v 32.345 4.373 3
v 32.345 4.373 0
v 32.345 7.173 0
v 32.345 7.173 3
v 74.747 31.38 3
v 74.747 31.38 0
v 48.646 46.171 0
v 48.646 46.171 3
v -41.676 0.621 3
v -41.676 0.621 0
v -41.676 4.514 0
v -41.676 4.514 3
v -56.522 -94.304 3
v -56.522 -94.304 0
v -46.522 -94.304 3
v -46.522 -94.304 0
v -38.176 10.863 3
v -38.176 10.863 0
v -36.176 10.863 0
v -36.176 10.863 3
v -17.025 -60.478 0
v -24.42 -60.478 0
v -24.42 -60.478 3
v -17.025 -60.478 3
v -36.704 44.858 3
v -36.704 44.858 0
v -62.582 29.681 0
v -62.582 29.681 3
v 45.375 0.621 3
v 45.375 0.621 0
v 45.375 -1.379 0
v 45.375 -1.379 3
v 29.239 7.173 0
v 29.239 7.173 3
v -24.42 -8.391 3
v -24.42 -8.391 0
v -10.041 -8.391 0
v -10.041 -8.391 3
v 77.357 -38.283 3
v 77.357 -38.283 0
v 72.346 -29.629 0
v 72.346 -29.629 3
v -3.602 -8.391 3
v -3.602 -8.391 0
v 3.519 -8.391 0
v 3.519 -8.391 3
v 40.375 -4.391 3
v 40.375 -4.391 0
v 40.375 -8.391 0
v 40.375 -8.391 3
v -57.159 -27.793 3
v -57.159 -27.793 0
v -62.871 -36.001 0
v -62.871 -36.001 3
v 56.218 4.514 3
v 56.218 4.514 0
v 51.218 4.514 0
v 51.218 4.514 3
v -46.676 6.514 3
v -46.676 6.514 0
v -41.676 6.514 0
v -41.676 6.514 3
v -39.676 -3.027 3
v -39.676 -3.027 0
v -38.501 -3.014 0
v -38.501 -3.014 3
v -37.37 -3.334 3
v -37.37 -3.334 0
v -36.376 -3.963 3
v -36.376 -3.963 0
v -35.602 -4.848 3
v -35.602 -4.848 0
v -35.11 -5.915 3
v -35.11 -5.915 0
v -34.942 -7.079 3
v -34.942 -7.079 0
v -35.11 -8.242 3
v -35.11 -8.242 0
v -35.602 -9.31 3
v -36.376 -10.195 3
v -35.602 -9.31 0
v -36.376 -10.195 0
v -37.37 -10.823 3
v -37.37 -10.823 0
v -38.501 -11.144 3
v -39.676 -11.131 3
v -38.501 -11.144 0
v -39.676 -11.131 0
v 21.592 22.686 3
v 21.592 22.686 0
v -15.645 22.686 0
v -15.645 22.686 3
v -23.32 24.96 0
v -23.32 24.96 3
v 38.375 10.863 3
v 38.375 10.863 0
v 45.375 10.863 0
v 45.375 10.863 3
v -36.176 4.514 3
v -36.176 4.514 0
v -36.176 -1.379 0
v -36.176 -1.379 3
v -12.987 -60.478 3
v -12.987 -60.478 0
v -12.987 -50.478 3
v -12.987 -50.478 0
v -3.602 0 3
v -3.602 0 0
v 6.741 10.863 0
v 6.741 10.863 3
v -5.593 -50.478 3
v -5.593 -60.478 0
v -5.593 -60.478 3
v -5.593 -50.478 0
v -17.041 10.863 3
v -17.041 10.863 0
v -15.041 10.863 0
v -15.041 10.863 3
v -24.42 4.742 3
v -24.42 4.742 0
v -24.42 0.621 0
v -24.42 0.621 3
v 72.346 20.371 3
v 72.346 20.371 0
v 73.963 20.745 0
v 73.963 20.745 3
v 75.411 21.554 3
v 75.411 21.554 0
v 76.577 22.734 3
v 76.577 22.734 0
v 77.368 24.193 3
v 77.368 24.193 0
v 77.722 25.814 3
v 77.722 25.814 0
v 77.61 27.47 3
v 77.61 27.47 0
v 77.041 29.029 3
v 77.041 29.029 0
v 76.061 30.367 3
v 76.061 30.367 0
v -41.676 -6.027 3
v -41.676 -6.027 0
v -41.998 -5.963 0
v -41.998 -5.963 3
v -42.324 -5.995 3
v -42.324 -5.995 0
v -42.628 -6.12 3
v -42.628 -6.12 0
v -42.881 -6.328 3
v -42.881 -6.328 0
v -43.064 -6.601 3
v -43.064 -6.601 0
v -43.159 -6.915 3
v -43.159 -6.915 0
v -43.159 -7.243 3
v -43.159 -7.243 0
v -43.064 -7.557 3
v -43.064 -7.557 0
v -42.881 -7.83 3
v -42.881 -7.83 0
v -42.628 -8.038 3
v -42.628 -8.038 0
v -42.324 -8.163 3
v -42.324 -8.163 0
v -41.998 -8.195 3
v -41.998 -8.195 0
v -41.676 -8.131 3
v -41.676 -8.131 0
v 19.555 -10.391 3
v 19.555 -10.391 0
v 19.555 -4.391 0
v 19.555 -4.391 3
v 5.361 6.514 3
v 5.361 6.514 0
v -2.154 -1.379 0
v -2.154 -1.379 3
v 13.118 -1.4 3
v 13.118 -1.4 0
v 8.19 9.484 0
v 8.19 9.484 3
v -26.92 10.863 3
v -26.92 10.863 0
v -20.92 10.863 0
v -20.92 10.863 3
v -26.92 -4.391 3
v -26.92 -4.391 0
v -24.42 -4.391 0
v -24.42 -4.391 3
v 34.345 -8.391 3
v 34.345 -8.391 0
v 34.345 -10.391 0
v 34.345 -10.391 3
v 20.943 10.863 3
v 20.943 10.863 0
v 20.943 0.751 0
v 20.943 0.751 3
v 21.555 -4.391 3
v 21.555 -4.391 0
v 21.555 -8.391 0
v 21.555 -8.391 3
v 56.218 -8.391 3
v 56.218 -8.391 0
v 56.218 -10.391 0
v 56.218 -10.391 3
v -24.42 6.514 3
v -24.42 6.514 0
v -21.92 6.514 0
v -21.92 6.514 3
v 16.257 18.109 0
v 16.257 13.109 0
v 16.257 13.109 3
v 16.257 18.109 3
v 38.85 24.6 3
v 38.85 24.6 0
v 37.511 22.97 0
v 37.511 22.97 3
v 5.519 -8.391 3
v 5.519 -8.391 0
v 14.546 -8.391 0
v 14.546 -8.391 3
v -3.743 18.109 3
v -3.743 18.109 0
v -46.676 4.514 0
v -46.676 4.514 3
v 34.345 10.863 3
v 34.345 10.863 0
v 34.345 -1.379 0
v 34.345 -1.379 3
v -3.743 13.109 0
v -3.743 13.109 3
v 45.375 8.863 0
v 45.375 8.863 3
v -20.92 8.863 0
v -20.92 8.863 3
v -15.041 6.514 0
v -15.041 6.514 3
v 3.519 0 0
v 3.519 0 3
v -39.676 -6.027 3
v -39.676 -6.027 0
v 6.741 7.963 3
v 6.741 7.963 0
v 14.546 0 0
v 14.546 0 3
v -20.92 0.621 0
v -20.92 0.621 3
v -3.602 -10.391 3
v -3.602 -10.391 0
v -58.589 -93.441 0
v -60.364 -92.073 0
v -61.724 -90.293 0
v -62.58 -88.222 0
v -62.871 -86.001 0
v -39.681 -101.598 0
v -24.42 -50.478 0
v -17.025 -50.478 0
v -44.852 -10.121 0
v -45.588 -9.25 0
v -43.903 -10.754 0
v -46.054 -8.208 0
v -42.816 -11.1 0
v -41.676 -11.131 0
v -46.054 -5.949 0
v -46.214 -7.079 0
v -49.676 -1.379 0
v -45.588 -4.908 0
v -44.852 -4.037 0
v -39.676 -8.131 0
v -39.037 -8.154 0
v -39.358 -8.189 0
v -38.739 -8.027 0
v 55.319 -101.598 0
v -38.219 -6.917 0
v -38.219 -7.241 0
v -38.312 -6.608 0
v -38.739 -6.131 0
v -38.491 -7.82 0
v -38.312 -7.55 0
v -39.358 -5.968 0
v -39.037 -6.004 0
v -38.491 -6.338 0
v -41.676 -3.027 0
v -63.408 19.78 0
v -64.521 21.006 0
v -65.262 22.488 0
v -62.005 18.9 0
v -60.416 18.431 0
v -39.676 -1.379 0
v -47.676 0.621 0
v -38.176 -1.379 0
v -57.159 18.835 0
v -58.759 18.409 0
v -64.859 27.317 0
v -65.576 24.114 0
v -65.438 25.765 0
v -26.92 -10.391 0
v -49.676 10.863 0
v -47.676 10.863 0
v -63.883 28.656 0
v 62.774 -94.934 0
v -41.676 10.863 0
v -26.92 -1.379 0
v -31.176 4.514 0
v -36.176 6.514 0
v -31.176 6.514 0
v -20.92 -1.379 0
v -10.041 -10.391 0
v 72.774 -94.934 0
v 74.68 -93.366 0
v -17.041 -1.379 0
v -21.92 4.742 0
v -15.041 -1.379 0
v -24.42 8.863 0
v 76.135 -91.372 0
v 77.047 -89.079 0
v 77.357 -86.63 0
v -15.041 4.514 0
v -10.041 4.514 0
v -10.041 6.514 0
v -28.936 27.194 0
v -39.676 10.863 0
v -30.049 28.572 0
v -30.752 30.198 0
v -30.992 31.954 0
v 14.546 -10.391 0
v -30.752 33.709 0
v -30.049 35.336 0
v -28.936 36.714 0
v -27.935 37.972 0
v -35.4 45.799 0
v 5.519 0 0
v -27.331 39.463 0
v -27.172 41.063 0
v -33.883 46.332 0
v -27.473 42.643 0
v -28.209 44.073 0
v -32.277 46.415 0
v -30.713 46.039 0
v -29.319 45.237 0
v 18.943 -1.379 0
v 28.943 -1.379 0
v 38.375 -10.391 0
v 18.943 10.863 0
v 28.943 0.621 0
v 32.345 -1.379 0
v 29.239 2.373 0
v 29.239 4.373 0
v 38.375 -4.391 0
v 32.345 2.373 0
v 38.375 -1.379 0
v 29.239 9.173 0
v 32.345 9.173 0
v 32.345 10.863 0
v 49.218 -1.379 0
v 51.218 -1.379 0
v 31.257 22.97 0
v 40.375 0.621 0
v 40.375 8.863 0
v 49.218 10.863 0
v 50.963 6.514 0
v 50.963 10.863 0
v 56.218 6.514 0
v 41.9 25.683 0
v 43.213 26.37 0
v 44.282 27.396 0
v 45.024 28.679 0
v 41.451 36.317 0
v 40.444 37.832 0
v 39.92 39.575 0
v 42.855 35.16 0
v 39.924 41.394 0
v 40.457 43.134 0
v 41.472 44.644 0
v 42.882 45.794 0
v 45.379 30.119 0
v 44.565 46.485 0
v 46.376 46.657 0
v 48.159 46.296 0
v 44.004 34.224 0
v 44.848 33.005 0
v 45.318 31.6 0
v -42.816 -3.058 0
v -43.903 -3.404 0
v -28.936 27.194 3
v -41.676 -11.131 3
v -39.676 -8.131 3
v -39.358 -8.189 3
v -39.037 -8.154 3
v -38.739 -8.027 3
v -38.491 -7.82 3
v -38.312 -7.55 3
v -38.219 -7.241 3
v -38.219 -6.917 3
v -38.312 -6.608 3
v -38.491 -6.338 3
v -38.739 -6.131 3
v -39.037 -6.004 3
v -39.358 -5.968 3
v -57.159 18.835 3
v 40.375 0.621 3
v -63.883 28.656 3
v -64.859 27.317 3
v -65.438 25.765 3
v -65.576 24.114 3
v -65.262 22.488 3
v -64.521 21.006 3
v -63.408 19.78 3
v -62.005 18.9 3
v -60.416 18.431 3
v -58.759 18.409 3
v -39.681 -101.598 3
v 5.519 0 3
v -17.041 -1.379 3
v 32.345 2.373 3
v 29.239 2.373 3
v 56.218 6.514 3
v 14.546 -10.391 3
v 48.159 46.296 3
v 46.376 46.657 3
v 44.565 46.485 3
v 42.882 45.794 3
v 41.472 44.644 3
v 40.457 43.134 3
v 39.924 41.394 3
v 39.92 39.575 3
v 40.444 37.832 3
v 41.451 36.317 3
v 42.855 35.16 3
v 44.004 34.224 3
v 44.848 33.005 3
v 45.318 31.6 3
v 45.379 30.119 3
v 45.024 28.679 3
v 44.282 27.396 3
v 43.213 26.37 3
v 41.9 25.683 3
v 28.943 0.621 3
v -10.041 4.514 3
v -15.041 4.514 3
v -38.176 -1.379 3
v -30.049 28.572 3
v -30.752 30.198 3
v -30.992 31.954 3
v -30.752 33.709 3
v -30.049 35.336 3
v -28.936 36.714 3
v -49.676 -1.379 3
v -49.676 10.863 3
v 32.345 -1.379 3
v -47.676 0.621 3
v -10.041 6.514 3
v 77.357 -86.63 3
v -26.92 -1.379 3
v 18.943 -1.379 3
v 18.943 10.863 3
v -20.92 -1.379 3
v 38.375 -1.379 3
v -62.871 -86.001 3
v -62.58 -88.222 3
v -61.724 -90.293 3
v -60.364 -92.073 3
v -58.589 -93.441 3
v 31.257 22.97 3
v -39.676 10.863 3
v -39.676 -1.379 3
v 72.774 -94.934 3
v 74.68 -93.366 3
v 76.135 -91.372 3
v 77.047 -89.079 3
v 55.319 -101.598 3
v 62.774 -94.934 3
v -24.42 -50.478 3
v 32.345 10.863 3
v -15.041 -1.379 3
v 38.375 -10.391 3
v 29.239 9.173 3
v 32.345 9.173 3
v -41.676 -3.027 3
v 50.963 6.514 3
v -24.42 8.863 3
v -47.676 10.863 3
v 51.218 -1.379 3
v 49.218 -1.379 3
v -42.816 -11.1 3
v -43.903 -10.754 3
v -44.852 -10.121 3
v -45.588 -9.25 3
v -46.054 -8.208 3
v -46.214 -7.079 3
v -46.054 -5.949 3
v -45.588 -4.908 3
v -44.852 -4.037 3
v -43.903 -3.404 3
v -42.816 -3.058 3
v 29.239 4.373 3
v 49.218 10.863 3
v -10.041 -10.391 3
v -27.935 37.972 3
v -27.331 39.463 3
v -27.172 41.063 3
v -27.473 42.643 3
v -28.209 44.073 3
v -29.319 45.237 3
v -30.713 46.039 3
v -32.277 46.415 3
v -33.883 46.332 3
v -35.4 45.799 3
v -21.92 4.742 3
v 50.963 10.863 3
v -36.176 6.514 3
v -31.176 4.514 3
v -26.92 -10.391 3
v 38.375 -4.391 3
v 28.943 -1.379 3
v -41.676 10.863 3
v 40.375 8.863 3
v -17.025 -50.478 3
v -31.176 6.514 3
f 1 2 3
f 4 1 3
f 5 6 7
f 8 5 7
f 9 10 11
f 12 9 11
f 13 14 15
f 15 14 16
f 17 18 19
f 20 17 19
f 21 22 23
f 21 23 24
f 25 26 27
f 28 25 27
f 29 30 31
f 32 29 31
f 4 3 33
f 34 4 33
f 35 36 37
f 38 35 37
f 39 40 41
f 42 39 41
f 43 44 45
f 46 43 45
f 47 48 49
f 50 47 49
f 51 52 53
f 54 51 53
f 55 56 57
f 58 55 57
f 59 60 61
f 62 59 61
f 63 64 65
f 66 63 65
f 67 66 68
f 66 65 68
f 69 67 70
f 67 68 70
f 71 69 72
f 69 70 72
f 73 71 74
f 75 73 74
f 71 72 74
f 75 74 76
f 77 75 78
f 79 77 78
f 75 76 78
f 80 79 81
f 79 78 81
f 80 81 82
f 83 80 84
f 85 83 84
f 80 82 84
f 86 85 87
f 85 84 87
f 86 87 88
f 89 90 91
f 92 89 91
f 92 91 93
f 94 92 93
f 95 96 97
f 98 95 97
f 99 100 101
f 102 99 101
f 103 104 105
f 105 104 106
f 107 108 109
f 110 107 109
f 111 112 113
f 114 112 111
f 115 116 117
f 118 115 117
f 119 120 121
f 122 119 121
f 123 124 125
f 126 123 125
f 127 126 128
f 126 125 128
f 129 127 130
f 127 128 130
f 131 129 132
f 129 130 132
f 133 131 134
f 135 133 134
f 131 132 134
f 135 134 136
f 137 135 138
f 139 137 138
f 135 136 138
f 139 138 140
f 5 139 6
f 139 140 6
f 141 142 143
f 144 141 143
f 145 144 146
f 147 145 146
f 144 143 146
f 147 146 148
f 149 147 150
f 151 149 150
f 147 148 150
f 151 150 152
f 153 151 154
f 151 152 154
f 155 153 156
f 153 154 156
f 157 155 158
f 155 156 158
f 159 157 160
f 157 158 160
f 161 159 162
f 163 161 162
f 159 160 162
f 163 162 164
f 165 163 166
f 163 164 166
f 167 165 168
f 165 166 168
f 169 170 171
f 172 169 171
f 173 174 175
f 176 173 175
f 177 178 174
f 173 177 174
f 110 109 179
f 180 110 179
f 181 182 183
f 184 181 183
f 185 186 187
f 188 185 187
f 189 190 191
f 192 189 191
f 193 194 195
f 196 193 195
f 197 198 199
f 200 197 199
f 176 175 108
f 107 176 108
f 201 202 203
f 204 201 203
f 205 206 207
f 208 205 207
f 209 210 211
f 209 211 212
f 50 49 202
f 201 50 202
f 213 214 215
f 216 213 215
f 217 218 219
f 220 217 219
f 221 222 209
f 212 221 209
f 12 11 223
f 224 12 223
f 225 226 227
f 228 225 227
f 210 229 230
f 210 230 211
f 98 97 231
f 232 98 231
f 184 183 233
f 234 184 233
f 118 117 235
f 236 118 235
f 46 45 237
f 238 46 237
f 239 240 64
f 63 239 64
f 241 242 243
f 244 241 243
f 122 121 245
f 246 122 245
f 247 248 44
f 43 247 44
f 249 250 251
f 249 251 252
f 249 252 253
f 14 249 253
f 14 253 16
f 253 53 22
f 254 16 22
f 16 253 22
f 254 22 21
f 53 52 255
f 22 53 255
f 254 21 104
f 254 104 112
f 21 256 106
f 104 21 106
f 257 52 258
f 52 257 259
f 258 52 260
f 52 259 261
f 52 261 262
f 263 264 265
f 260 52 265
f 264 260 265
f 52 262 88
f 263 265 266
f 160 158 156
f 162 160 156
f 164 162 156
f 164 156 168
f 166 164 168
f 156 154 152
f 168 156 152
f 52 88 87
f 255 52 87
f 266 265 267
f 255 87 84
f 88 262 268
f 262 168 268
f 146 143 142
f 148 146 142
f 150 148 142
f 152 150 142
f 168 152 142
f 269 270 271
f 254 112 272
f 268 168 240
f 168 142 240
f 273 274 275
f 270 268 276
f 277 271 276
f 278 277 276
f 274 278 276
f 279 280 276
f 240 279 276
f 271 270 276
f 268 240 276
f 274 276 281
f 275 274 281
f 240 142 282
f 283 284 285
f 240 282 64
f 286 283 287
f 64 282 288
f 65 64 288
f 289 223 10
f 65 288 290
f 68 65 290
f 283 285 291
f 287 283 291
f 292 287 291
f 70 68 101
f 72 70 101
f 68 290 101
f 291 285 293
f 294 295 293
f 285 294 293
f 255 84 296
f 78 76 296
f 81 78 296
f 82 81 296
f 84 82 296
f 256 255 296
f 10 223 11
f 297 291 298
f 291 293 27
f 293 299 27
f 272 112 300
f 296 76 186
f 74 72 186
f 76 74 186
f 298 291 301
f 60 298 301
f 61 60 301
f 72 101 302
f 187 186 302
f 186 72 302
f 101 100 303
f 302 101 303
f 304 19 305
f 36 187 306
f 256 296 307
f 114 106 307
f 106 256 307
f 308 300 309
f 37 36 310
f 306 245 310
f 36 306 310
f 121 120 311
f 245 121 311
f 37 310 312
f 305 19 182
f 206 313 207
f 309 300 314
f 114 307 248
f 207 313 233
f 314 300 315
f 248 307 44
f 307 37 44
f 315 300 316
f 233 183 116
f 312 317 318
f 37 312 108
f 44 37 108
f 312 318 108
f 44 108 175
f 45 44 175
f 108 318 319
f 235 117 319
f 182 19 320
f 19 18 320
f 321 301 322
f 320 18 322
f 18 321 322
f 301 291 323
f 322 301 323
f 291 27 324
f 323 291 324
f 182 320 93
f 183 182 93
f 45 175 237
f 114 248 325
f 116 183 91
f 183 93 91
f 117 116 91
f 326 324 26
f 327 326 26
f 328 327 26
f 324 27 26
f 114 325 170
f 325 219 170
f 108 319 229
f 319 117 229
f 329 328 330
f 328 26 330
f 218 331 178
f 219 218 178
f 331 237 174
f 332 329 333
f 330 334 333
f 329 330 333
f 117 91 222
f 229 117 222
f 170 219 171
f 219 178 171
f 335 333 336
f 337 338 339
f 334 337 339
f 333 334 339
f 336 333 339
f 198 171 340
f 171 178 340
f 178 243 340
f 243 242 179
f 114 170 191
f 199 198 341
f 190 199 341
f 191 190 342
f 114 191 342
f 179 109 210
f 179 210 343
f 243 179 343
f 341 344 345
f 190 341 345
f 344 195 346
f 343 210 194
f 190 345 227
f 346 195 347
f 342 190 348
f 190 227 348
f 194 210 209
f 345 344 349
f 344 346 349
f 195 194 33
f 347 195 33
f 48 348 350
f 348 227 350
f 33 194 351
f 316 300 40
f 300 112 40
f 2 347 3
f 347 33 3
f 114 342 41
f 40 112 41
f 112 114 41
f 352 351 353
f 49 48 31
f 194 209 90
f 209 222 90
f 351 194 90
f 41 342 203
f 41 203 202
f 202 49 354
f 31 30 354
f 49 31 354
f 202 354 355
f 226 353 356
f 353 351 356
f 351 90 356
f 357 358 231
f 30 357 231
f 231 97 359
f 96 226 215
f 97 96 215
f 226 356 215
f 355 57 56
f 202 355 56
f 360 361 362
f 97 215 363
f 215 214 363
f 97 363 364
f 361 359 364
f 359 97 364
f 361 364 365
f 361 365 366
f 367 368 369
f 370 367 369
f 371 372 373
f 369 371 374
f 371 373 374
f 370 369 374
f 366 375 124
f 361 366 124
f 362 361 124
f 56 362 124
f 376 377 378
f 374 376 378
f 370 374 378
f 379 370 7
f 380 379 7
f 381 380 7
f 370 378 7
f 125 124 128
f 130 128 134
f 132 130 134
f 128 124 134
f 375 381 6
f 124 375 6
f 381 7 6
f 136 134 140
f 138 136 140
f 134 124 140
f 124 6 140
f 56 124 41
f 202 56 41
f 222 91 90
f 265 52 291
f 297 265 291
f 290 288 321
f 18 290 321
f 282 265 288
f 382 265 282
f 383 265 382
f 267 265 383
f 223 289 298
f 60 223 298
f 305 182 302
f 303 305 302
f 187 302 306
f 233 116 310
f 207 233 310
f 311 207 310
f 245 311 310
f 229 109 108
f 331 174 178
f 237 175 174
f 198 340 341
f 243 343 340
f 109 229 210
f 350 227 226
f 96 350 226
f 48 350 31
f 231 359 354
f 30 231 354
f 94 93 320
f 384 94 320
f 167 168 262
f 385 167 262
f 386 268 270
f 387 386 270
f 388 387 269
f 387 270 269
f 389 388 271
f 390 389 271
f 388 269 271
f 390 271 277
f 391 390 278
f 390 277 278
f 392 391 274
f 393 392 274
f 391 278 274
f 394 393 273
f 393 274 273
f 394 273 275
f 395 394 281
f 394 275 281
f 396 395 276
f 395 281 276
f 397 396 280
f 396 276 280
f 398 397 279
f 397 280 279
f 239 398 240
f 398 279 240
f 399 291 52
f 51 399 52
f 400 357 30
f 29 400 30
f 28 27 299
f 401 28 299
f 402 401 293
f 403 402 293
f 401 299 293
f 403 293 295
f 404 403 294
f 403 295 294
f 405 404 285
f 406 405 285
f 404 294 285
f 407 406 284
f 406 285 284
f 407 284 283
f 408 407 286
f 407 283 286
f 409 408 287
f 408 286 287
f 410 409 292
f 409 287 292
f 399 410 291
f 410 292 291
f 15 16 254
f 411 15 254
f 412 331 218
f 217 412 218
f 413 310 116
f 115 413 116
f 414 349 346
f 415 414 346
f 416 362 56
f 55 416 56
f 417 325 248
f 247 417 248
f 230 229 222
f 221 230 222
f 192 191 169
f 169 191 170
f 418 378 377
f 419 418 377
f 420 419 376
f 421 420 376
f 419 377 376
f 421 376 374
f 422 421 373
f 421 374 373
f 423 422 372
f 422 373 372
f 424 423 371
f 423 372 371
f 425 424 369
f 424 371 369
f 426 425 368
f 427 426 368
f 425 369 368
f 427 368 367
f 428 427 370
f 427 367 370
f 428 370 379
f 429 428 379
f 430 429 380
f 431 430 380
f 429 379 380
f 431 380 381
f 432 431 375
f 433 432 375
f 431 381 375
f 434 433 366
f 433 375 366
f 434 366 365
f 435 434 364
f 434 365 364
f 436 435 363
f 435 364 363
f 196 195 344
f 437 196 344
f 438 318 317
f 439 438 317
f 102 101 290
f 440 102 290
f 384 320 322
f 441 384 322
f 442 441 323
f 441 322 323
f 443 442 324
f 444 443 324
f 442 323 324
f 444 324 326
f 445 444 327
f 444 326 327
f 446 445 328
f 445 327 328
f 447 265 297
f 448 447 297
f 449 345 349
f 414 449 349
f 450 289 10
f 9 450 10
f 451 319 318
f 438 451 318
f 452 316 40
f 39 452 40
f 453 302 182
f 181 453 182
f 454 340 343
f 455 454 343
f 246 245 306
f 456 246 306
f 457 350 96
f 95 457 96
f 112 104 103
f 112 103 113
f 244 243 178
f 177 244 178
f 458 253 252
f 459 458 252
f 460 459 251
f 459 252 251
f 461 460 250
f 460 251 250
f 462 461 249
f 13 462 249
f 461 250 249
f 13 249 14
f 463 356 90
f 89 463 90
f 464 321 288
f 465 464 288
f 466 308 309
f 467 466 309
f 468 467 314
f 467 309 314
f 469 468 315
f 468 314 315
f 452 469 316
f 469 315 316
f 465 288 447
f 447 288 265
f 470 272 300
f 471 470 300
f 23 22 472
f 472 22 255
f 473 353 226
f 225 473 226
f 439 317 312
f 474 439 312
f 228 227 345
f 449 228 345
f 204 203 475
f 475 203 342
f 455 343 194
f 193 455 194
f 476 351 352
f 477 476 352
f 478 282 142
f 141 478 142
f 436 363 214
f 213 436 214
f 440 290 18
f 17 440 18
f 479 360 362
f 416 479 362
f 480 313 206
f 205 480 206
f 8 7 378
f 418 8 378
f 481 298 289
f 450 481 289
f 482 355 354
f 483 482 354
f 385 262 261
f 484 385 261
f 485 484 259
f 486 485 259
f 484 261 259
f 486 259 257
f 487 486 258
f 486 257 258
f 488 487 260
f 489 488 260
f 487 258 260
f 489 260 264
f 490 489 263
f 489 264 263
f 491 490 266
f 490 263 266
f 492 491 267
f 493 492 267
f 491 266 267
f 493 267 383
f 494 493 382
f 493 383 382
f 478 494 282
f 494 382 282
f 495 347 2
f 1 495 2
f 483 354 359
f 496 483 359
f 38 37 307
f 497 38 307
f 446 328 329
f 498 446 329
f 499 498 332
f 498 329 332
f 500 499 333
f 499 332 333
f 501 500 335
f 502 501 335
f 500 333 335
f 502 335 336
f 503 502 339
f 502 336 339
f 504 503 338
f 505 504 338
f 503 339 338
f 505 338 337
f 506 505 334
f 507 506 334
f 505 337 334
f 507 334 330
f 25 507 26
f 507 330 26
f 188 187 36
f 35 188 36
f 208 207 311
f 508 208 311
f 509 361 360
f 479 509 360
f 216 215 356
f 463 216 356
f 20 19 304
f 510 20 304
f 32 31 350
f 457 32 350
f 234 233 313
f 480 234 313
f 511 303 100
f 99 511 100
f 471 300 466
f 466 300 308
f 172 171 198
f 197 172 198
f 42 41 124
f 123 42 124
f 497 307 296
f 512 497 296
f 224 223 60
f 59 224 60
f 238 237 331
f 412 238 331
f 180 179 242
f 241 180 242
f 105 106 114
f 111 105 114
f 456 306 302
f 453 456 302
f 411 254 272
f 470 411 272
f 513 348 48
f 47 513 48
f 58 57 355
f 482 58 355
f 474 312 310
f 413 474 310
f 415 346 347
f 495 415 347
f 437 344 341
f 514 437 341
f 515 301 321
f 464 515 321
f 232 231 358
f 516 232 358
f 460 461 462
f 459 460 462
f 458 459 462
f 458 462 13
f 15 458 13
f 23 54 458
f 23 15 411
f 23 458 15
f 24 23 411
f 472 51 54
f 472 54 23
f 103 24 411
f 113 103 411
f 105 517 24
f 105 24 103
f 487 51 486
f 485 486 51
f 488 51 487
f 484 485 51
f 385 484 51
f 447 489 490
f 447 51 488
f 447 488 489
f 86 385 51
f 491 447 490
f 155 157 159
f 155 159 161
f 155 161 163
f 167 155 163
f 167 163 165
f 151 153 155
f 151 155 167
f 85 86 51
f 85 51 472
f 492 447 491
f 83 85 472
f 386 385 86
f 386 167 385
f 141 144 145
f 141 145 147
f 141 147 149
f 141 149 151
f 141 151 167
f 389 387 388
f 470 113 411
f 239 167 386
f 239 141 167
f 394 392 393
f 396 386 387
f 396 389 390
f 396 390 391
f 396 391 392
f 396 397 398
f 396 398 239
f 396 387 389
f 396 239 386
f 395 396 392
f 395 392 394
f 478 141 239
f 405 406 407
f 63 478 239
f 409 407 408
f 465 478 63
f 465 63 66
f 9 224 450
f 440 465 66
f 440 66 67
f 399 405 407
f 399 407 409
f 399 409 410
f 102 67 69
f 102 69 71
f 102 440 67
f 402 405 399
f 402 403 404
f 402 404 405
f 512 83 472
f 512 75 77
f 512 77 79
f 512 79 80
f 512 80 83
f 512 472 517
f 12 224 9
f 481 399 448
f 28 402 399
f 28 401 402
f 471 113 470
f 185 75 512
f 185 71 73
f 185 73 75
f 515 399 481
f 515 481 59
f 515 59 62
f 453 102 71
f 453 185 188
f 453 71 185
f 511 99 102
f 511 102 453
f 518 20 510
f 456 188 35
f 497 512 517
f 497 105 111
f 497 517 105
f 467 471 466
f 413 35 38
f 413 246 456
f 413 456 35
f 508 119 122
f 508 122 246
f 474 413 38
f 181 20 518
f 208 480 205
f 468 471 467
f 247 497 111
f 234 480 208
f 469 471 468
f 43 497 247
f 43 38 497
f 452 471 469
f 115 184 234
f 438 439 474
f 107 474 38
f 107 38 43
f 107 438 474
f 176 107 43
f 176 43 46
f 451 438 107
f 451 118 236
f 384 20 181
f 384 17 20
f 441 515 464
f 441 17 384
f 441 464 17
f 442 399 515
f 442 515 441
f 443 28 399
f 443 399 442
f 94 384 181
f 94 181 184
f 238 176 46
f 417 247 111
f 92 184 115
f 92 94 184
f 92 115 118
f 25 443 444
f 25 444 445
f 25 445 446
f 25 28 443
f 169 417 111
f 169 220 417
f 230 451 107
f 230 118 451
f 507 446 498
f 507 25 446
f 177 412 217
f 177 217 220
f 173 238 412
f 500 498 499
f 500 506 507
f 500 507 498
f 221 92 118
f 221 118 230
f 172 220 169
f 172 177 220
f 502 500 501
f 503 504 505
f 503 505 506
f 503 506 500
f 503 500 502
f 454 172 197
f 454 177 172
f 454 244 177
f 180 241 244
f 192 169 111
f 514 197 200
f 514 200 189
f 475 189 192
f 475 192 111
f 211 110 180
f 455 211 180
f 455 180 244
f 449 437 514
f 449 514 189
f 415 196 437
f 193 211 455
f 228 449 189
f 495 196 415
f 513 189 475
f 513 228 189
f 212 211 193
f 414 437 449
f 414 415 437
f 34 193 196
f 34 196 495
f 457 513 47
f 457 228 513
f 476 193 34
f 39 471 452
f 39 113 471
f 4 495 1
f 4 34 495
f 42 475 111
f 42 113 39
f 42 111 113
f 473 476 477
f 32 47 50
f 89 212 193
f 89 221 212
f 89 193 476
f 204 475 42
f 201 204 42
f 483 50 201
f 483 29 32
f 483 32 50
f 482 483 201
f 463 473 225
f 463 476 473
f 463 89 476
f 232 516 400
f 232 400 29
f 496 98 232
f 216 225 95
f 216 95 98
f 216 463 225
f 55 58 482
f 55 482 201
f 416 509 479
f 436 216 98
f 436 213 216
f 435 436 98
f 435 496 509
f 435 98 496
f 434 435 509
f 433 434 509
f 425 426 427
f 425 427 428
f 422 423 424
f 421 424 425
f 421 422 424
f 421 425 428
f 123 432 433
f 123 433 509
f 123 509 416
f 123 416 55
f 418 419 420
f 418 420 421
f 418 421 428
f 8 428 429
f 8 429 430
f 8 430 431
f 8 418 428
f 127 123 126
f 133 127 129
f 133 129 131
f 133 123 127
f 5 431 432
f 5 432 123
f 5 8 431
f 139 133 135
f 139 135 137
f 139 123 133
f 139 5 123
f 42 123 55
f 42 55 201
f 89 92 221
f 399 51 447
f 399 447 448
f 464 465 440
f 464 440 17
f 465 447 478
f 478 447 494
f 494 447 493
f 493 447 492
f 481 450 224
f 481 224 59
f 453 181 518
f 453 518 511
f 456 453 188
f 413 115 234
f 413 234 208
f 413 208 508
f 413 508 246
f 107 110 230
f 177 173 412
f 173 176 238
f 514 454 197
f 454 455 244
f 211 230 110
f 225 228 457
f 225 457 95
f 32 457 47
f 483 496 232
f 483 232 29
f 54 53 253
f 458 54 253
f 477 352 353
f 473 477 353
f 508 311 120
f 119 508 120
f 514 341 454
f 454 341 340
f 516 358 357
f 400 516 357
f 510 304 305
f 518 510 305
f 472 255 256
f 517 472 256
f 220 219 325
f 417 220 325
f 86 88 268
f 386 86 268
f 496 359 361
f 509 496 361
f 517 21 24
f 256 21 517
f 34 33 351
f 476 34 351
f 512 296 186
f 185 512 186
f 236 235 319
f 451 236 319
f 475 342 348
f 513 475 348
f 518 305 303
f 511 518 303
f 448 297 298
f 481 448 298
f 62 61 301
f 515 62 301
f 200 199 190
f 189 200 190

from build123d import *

# Parameters (mm, degrees)
F0_W     = 7.3944082856
F0_H     = 10
F0_W_2   = 7.394
F0_W_3   = 20
F0_H_2   = 5
F0_W_4   = 12.9295032024
F0_H_3   = 4
F0_W_5   = 4
F0_H_4   = 2
F1_DEPTH = 3


with BuildPart() as f1:
    # F0 (on Top) → F1 (new body)
    with BuildSketch(Plane.XY):
        with BuildLine():
            Line((72.3460563783, -23.3392287046), (-57.1586965515, -23.3392287046))
            Line((-57.1586965515, -23.3392287046), (-57.1586965515, -27.7934716308))
            Line((-57.1586965515, -27.7934716308), (-62.8714114428, -36.0010832548))
            Line((-62.8714114428, -36.0010832548), (-62.8714114428, -86.0010832548))
            ThreePointArc((-62.8714114428, -86.0010832548), (-61.102155393, -91.2274471391), (-56.5220229328, -94.3043828011))
            Line((-56.5220229328, -94.3043828011), (-46.5220229328, -94.3043828011))
            Line((-46.5220229328, -94.3043828011), (-39.6812242775, -101.5984539385))
            Line((-39.6812242775, -101.5984539385), (55.3187757225, -101.5984539385))
            Line((55.3187757225, -101.5984539385), (62.774033672, -94.9336862077))
            Line((62.774033672, -94.9336862077), (72.774033672, -94.9336862077))
            ThreePointArc((72.774033672, -94.9336862077), (76.135356085, -91.3724962002), (77.3572234082, -86.6303866614))
            Line((77.3572234082, -86.6303866614), (77.3572234082, -38.2830989705))
            Line((77.3572234082, -38.2830989705), (72.3460563783, -29.6293018271))
            Line((72.3460563783, -29.6293018271), (72.3460563783, -23.3392287046))
        make_face()
        Polygon((-33.379150033, -48.477938503), (-33.379150033, -46.477938503), (-34.9630750716, -46.477938503), (-34.9630750716, -50.477938503), (-33.379150033, -50.477938503), (-33.379150033, -60.477938503), (-34.9630750716, -60.477938503), (-34.9630750716, -64.477938503), (-33.379150033, -64.477938503), (-33.379150033, -66.477938503), (-49.892578274, -66.477938503), (-49.892578274, -64.477938503), (-47.892578274, -64.477938503), (-47.892578274, -60.477938503), (-49.892578274, -60.477938503), (-49.892578274, -50.477938503), (-47.892578274, -50.477938503), (-47.892578274, -46.477938503), (-49.892578274, -46.477938503), (-49.892578274, -44.477938503), (-45.951873064, -44.477938503), (-45.951873064, -42.477938503), (-47.4065802991, -42.477938503), (-47.4065802991, -40.477938503), (-34.9630750716, -40.477938503), (-31.379150033, -44.477938503), (-31.379150033, -48.477938503), align=None, mode=Mode.SUBTRACT)
        with Locations((-20.7225426286, -55.477938503)):
            Rectangle(F0_W, F0_H, mode=Mode.SUBTRACT)
        with Locations((-9.2900967939, -55.477938503)):
            Rectangle(F0_W_2, F0_H, mode=Mode.SUBTRACT)
        with BuildLine():
            Line((23.9428310841, -64.477938503), (23.9428310841, -36.0010832548))
            Line((23.9428310841, -36.0010832548), (33.941513979, -36.163380414))
            Line((33.941513979, -36.163380414), (33.941513979, -64.477938503))
            ThreePointArc((33.941513979, -64.477938503), (28.9421725316, -69.4772799505), (23.9428310841, -64.477938503))
        make_face(mode=Mode.SUBTRACT)
        with BuildLine():
            Line((38.3750386536, -64.477938503), (38.3750386536, -36.163380414))
            Line((38.3750386536, -36.163380414), (48.3750386536, -36.163380414))
            Line((48.3750386536, -36.163380414), (48.3750386536, -64.477938503))
            ThreePointArc((48.3750386536, -64.477938503), (43.3750386536, -69.477938503), (38.3750386536, -64.477938503))
        make_face(mode=Mode.SUBTRACT)
        with BuildLine():
            ThreePointArc((-28.9360948412, 27.1936530951), (-30.9919428027, 31.9537867139), (-28.9360948412, 36.7139203326))
            ThreePointArc((-28.9360948412, 36.7139203326), (-28.7221124747, 44.6950672996), (-36.7044586735, 44.8582988061))
            Line((-36.7044586735, 44.8582988061), (-62.5819294645, 29.6807988322))
            ThreePointArc((-62.5819294645, 29.6807988322), (-64.9426232399, 21.7216482709), (-57.1586965515, 18.8352252132))
            Line((-57.1586965515, 18.8352252132), (-57.1586965515, 13.1085557863))
            Line((-57.1586965515, 13.1085557863), (-57.1586965515, -11.8914442137))
            Line((-57.1586965515, -11.8914442137), (-57.1586965515, -23.3392287046))
            Line((-57.1586965515, -23.3392287046), (72.3460563783, -23.3392287046))
            Line((72.3460563783, -23.3392287046), (72.3460563783, 20.3706981729))
            ThreePointArc((72.3460563783, 20.3706981729), (77.602081112, 24.9911609789), (74.7467246428, 31.3803246156))
            Line((74.7467246428, 31.3803246156), (48.6460575227, 46.1706990491))
            Line((48.6460575227, 46.1706990491), (48.1593732874, 46.2963732235))
            ThreePointArc((48.1593732874, 46.2963732235), (40.4569849003, 43.1335810056), (42.8548762559, 35.1598642733))
            ThreePointArc((42.8548762559, 35.1598642733), (45.3786536259, 30.1186614419), (41.8995591407, 25.6825505592))
            Line((41.8995591407, 25.6825505592), (38.8500019908, 24.5999991894))
            Line((38.8500019908, 24.5999991894), (37.5105995638, 22.970316542))
            Line((37.5105995638, 22.970316542), (31.2569938554, 22.970316542))
            Line((31.2569938554, 22.970316542), (21.5923260851, 22.6860638537))
            Line((21.5923260851, 22.6860638537), (-9.1071914928, 22.6860638537))
            Line((-9.1071914928, 22.6860638537), (-15.6450517522, 22.6860638537))
            Line((-15.6450517522, 22.6860638537), (-23.319932078, 24.9601021238))
            Line((-23.319932078, 24.9601021238), (-28.9360948412, 27.1936530951))
        make_face()
        with BuildLine():
            ThreePointArc((-41.6760705411, -11.1311366782), (-46.2140015275, -7.0789042059), (-41.6760705411, -3.0266717337))
            Line((-41.6760705411, -3.0266717337), (-41.6760705411, -6.0266717337))
            ThreePointArc((-41.6760705411, -6.0266717337), (-43.1709154899, -7.0789042059), (-41.6760705411, -8.1311366782))
            Line((-41.6760705411, -8.1311366782), (-41.6760705411, -11.1311366782))
        make_face(mode=Mode.SUBTRACT)
        with BuildLine():
            Line((-39.6760705411, -6.0266717337), (-39.6760705411, -3.0266717337))
            ThreePointArc((-39.6760705411, -3.0266717337), (-34.941686368, -7.0789042059), (-39.6760705411, -11.1311366782))
            Line((-39.6760705411, -11.1311366782), (-39.6760705411, -8.1311366782))
            ThreePointArc((-39.6760705411, -8.1311366782), (-38.2074366729, -7.0789042059), (-39.6760705411, -6.0266717337))
        make_face(mode=Mode.SUBTRACT)
        Polygon((-41.6760705411, 10.8633437433), (-39.6760705411, 10.8633437433), (-39.6760705411, -1.3791318539), (-49.6760705411, -1.3791318539), (-49.6760705411, 10.8633437433), (-47.6760705411, 10.8633437433), (-47.6760705411, 0.6208681461), (-41.6760705411, 0.6208681461), (-41.6760705411, 4.5136589747), (-46.6760705411, 4.5136589747), (-46.6760705411, 6.5136589747), (-41.6760705411, 6.5136589747), align=None, mode=Mode.SUBTRACT)
        Polygon((-38.1764359772, 10.8633437433), (-36.1764359772, 10.8633437433), (-36.1764359772, 6.5136589747), (-31.1764359772, 6.5136589747), (-31.1764359772, 4.5136589747), (-33.379150033, 4.5136589747), (-36.1764359772, 4.5136589747), (-36.1764359772, -1.3791318539), (-38.1764359772, -1.3791318539), align=None, mode=Mode.SUBTRACT)
        Polygon((-10.0414280146, -10.3910174221), (-26.9197467715, -10.3910174221), (-26.9197467715, -4.3910174221), (-24.4197467715, -4.3910174221), (-24.4197467715, -8.3910174221), (-10.0414280146, -8.3910174221), align=None, mode=Mode.SUBTRACT)
        Polygon((-26.9197467715, 10.8633437433), (-20.9197467715, 10.8633437433), (-20.9197467715, 8.8633437433), (-24.4197467715, 8.8633437433), (-24.4197467715, 6.5136589747), (-21.9197467715, 6.5136589747), (-21.9197467715, 4.7421059447), (-24.4197467715, 4.7421059447), (-24.4197467715, 0.6208681461), (-20.9197467715, 0.6208681461), (-20.9197467715, -1.3791318539), (-26.9197467715, -1.3791318539), align=None, mode=Mode.SUBTRACT)
        Polygon((-17.0414280146, 10.8633437433), (-15.0414280146, 10.8633437433), (-15.0414280146, 6.5136589747), (-10.0414280146, 6.5136589747), (-10.0414280146, 4.5136589747), (-15.0414280146, 4.5136589747), (-15.0414280146, -1.3791318539), (-17.0414280146, -1.3791318539), align=None, mode=Mode.SUBTRACT)
        Polygon((-3.6023200955, -8.3910174221), (2.8300732374, -8.3910174221), (3.5192577634, -8.3910174221), (3.5192577634, 0), (5.5192577634, 0), (5.5192577634, -8.3910174221), (14.5462173969, -8.3910174221), (14.5462173969, -10.3910174221), (-3.6023200955, -10.3910174221), align=None, mode=Mode.SUBTRACT)
        Polygon((-3.6023200955, 0), (6.7411688089, 10.8633437433), (8.1896146413, 9.4842118894), (6.7411688089, 7.9629684176), (14.5462173969, 0), (13.1179118348, -1.3999797218), (5.3612146718, 6.5136589747), (-2.1538742631, -1.3791318539), align=None, mode=Mode.SUBTRACT)
        Polygon((18.9428310841, -1.3791318539), (18.9428310841, 10.8633437433), (20.9428310841, 10.8633437433), (20.9428310841, 0.7507229767), (28.9428310841, 0.6208681461), (28.9428310841, -1.3791318539), align=None, mode=Mode.SUBTRACT)
        Polygon((19.5553395897, -10.3910174221), (19.5553395897, -4.3910174221), (21.5553395897, -4.3910174221), (21.5553395897, -8.3910174221), (34.3452949524, -8.3910174221), (34.3452949524, -10.3910174221), align=None, mode=Mode.SUBTRACT)
        Polygon((32.3452949524, 10.8633437433), (34.3452949524, 10.8633437433), (34.3452949524, -1.3791318539), (32.3452949524, -1.3791318539), (32.3452949524, 2.3732802365), (29.2392894626, 2.3732802365), (29.2392894626, 4.3732802365), (32.3452949524, 4.3732802365), (32.3452949524, 7.1734678932), (29.2392894626, 7.1734678932), (29.2392894626, 9.1734678932), (32.3452949524, 9.1734678932), align=None, mode=Mode.SUBTRACT)
        Polygon((38.3750386536, -1.3791318539), (38.3750386536, 10.8633437433), (45.3750386536, 10.8633437433), (45.3750386536, 8.8633437433), (40.3750386536, 8.8633437433), (40.3750386536, 0.6208681461), (45.3750386536, 0.6208681461), (45.3750386536, -1.3791318539), align=None, mode=Mode.SUBTRACT)
        Polygon((38.3750386536, -10.3910174221), (38.3750386536, -4.3910174221), (40.3750386536, -4.3910174221), (40.3750386536, -8.3910174221), (56.2181740701, -8.3910174221), (56.2181740701, -10.3910174221), align=None, mode=Mode.SUBTRACT)
        Polygon((49.2181740701, -1.3791318539), (49.2181740701, 10.8633437433), (50.9630478919, 10.8633437433), (50.9630478919, 6.5136589747), (56.2181740701, 6.5136589747), (56.2181740701, 4.5136589747), (51.2181740701, 4.5136589747), (51.2181740701, -1.3791318539), align=None, mode=Mode.SUBTRACT)
        with Locations((6.2573329513, 15.6085557863)):
            Rectangle(F0_W_3, F0_H_2, mode=Mode.SUBTRACT)
        with BuildLine():
            Line((33.941513979, -36.163380414), (23.9428310841, -36.0010832548))
            Line((23.9428310841, -36.0010832548), (23.9428310841, -64.477938503))
            ThreePointArc((23.9428310841, -64.477938503), (28.9421725316, -69.4772799505), (33.941513979, -64.477938503))
            Line((33.941513979, -64.477938503), (33.941513979, -36.163380414))
        make_face()
        with BuildLine():
            Line((48.3750386536, -36.163380414), (38.3750386536, -36.163380414))
            Line((38.3750386536, -36.163380414), (38.3750386536, -64.477938503))
            ThreePointArc((38.3750386536, -64.477938503), (43.3750386536, -69.477938503), (48.3750386536, -64.477938503))
            Line((48.3750386536, -64.477938503), (48.3750386536, -36.163380414))
        make_face()
        Polygon((-33.379150033, -50.477938503), (-34.9630750716, -50.477938503), (-47.892578274, -50.477938503), (-49.892578274, -50.477938503), (-49.892578274, -60.477938503), (-47.892578274, -60.477938503), (-34.9630750716, -60.477938503), (-33.379150033, -60.477938503), align=None)
        with Locations((-41.4278266728, -48.477938503)):
            Rectangle(F0_W_4, F0_H_3)
        with Locations((-41.4278266728, -62.477938503)):
            Rectangle(F0_W_4, F0_H_3)
        Polygon((-34.9630750716, -42.477938503), (-33.379150033, -44.477938503), (-33.379150033, -46.477938503), (-33.379150033, -48.477938503), (-31.379150033, -48.477938503), (-31.379150033, -44.477938503), (-34.9630750716, -40.477938503), (-47.4065802991, -40.477938503), (-47.4065802991, -42.477938503), (-45.951873064, -42.477938503), (-41.951873064, -42.477938503), (-37.951873064, -42.477938503), align=None)
        Polygon((-33.379150033, -64.477938503), (-34.9630750716, -64.477938503), (-47.892578274, -64.477938503), (-49.892578274, -64.477938503), (-49.892578274, -66.477938503), (-33.379150033, -66.477938503), align=None)
        Polygon((-33.379150033, -46.477938503), (-33.379150033, -44.477938503), (-37.951873064, -44.477938503), (-41.951873064, -44.477938503), (-45.951873064, -44.477938503), (-49.892578274, -44.477938503), (-49.892578274, -46.477938503), (-47.892578274, -46.477938503), (-34.9630750716, -46.477938503), align=None)
        with Locations((-39.951873064, -43.477938503)):
            Rectangle(F0_W_5, F0_H_4)
        with Locations((-43.951873064, -43.477938503)):
            Rectangle(F0_W_5, F0_H_4)
        Polygon((-37.951873064, -44.477938503), (-33.379150033, -44.477938503), (-34.9630750716, -42.477938503), (-37.951873064, -42.477938503), align=None)
    extrude(amount=F1_DEPTH)


solid = f1.part
